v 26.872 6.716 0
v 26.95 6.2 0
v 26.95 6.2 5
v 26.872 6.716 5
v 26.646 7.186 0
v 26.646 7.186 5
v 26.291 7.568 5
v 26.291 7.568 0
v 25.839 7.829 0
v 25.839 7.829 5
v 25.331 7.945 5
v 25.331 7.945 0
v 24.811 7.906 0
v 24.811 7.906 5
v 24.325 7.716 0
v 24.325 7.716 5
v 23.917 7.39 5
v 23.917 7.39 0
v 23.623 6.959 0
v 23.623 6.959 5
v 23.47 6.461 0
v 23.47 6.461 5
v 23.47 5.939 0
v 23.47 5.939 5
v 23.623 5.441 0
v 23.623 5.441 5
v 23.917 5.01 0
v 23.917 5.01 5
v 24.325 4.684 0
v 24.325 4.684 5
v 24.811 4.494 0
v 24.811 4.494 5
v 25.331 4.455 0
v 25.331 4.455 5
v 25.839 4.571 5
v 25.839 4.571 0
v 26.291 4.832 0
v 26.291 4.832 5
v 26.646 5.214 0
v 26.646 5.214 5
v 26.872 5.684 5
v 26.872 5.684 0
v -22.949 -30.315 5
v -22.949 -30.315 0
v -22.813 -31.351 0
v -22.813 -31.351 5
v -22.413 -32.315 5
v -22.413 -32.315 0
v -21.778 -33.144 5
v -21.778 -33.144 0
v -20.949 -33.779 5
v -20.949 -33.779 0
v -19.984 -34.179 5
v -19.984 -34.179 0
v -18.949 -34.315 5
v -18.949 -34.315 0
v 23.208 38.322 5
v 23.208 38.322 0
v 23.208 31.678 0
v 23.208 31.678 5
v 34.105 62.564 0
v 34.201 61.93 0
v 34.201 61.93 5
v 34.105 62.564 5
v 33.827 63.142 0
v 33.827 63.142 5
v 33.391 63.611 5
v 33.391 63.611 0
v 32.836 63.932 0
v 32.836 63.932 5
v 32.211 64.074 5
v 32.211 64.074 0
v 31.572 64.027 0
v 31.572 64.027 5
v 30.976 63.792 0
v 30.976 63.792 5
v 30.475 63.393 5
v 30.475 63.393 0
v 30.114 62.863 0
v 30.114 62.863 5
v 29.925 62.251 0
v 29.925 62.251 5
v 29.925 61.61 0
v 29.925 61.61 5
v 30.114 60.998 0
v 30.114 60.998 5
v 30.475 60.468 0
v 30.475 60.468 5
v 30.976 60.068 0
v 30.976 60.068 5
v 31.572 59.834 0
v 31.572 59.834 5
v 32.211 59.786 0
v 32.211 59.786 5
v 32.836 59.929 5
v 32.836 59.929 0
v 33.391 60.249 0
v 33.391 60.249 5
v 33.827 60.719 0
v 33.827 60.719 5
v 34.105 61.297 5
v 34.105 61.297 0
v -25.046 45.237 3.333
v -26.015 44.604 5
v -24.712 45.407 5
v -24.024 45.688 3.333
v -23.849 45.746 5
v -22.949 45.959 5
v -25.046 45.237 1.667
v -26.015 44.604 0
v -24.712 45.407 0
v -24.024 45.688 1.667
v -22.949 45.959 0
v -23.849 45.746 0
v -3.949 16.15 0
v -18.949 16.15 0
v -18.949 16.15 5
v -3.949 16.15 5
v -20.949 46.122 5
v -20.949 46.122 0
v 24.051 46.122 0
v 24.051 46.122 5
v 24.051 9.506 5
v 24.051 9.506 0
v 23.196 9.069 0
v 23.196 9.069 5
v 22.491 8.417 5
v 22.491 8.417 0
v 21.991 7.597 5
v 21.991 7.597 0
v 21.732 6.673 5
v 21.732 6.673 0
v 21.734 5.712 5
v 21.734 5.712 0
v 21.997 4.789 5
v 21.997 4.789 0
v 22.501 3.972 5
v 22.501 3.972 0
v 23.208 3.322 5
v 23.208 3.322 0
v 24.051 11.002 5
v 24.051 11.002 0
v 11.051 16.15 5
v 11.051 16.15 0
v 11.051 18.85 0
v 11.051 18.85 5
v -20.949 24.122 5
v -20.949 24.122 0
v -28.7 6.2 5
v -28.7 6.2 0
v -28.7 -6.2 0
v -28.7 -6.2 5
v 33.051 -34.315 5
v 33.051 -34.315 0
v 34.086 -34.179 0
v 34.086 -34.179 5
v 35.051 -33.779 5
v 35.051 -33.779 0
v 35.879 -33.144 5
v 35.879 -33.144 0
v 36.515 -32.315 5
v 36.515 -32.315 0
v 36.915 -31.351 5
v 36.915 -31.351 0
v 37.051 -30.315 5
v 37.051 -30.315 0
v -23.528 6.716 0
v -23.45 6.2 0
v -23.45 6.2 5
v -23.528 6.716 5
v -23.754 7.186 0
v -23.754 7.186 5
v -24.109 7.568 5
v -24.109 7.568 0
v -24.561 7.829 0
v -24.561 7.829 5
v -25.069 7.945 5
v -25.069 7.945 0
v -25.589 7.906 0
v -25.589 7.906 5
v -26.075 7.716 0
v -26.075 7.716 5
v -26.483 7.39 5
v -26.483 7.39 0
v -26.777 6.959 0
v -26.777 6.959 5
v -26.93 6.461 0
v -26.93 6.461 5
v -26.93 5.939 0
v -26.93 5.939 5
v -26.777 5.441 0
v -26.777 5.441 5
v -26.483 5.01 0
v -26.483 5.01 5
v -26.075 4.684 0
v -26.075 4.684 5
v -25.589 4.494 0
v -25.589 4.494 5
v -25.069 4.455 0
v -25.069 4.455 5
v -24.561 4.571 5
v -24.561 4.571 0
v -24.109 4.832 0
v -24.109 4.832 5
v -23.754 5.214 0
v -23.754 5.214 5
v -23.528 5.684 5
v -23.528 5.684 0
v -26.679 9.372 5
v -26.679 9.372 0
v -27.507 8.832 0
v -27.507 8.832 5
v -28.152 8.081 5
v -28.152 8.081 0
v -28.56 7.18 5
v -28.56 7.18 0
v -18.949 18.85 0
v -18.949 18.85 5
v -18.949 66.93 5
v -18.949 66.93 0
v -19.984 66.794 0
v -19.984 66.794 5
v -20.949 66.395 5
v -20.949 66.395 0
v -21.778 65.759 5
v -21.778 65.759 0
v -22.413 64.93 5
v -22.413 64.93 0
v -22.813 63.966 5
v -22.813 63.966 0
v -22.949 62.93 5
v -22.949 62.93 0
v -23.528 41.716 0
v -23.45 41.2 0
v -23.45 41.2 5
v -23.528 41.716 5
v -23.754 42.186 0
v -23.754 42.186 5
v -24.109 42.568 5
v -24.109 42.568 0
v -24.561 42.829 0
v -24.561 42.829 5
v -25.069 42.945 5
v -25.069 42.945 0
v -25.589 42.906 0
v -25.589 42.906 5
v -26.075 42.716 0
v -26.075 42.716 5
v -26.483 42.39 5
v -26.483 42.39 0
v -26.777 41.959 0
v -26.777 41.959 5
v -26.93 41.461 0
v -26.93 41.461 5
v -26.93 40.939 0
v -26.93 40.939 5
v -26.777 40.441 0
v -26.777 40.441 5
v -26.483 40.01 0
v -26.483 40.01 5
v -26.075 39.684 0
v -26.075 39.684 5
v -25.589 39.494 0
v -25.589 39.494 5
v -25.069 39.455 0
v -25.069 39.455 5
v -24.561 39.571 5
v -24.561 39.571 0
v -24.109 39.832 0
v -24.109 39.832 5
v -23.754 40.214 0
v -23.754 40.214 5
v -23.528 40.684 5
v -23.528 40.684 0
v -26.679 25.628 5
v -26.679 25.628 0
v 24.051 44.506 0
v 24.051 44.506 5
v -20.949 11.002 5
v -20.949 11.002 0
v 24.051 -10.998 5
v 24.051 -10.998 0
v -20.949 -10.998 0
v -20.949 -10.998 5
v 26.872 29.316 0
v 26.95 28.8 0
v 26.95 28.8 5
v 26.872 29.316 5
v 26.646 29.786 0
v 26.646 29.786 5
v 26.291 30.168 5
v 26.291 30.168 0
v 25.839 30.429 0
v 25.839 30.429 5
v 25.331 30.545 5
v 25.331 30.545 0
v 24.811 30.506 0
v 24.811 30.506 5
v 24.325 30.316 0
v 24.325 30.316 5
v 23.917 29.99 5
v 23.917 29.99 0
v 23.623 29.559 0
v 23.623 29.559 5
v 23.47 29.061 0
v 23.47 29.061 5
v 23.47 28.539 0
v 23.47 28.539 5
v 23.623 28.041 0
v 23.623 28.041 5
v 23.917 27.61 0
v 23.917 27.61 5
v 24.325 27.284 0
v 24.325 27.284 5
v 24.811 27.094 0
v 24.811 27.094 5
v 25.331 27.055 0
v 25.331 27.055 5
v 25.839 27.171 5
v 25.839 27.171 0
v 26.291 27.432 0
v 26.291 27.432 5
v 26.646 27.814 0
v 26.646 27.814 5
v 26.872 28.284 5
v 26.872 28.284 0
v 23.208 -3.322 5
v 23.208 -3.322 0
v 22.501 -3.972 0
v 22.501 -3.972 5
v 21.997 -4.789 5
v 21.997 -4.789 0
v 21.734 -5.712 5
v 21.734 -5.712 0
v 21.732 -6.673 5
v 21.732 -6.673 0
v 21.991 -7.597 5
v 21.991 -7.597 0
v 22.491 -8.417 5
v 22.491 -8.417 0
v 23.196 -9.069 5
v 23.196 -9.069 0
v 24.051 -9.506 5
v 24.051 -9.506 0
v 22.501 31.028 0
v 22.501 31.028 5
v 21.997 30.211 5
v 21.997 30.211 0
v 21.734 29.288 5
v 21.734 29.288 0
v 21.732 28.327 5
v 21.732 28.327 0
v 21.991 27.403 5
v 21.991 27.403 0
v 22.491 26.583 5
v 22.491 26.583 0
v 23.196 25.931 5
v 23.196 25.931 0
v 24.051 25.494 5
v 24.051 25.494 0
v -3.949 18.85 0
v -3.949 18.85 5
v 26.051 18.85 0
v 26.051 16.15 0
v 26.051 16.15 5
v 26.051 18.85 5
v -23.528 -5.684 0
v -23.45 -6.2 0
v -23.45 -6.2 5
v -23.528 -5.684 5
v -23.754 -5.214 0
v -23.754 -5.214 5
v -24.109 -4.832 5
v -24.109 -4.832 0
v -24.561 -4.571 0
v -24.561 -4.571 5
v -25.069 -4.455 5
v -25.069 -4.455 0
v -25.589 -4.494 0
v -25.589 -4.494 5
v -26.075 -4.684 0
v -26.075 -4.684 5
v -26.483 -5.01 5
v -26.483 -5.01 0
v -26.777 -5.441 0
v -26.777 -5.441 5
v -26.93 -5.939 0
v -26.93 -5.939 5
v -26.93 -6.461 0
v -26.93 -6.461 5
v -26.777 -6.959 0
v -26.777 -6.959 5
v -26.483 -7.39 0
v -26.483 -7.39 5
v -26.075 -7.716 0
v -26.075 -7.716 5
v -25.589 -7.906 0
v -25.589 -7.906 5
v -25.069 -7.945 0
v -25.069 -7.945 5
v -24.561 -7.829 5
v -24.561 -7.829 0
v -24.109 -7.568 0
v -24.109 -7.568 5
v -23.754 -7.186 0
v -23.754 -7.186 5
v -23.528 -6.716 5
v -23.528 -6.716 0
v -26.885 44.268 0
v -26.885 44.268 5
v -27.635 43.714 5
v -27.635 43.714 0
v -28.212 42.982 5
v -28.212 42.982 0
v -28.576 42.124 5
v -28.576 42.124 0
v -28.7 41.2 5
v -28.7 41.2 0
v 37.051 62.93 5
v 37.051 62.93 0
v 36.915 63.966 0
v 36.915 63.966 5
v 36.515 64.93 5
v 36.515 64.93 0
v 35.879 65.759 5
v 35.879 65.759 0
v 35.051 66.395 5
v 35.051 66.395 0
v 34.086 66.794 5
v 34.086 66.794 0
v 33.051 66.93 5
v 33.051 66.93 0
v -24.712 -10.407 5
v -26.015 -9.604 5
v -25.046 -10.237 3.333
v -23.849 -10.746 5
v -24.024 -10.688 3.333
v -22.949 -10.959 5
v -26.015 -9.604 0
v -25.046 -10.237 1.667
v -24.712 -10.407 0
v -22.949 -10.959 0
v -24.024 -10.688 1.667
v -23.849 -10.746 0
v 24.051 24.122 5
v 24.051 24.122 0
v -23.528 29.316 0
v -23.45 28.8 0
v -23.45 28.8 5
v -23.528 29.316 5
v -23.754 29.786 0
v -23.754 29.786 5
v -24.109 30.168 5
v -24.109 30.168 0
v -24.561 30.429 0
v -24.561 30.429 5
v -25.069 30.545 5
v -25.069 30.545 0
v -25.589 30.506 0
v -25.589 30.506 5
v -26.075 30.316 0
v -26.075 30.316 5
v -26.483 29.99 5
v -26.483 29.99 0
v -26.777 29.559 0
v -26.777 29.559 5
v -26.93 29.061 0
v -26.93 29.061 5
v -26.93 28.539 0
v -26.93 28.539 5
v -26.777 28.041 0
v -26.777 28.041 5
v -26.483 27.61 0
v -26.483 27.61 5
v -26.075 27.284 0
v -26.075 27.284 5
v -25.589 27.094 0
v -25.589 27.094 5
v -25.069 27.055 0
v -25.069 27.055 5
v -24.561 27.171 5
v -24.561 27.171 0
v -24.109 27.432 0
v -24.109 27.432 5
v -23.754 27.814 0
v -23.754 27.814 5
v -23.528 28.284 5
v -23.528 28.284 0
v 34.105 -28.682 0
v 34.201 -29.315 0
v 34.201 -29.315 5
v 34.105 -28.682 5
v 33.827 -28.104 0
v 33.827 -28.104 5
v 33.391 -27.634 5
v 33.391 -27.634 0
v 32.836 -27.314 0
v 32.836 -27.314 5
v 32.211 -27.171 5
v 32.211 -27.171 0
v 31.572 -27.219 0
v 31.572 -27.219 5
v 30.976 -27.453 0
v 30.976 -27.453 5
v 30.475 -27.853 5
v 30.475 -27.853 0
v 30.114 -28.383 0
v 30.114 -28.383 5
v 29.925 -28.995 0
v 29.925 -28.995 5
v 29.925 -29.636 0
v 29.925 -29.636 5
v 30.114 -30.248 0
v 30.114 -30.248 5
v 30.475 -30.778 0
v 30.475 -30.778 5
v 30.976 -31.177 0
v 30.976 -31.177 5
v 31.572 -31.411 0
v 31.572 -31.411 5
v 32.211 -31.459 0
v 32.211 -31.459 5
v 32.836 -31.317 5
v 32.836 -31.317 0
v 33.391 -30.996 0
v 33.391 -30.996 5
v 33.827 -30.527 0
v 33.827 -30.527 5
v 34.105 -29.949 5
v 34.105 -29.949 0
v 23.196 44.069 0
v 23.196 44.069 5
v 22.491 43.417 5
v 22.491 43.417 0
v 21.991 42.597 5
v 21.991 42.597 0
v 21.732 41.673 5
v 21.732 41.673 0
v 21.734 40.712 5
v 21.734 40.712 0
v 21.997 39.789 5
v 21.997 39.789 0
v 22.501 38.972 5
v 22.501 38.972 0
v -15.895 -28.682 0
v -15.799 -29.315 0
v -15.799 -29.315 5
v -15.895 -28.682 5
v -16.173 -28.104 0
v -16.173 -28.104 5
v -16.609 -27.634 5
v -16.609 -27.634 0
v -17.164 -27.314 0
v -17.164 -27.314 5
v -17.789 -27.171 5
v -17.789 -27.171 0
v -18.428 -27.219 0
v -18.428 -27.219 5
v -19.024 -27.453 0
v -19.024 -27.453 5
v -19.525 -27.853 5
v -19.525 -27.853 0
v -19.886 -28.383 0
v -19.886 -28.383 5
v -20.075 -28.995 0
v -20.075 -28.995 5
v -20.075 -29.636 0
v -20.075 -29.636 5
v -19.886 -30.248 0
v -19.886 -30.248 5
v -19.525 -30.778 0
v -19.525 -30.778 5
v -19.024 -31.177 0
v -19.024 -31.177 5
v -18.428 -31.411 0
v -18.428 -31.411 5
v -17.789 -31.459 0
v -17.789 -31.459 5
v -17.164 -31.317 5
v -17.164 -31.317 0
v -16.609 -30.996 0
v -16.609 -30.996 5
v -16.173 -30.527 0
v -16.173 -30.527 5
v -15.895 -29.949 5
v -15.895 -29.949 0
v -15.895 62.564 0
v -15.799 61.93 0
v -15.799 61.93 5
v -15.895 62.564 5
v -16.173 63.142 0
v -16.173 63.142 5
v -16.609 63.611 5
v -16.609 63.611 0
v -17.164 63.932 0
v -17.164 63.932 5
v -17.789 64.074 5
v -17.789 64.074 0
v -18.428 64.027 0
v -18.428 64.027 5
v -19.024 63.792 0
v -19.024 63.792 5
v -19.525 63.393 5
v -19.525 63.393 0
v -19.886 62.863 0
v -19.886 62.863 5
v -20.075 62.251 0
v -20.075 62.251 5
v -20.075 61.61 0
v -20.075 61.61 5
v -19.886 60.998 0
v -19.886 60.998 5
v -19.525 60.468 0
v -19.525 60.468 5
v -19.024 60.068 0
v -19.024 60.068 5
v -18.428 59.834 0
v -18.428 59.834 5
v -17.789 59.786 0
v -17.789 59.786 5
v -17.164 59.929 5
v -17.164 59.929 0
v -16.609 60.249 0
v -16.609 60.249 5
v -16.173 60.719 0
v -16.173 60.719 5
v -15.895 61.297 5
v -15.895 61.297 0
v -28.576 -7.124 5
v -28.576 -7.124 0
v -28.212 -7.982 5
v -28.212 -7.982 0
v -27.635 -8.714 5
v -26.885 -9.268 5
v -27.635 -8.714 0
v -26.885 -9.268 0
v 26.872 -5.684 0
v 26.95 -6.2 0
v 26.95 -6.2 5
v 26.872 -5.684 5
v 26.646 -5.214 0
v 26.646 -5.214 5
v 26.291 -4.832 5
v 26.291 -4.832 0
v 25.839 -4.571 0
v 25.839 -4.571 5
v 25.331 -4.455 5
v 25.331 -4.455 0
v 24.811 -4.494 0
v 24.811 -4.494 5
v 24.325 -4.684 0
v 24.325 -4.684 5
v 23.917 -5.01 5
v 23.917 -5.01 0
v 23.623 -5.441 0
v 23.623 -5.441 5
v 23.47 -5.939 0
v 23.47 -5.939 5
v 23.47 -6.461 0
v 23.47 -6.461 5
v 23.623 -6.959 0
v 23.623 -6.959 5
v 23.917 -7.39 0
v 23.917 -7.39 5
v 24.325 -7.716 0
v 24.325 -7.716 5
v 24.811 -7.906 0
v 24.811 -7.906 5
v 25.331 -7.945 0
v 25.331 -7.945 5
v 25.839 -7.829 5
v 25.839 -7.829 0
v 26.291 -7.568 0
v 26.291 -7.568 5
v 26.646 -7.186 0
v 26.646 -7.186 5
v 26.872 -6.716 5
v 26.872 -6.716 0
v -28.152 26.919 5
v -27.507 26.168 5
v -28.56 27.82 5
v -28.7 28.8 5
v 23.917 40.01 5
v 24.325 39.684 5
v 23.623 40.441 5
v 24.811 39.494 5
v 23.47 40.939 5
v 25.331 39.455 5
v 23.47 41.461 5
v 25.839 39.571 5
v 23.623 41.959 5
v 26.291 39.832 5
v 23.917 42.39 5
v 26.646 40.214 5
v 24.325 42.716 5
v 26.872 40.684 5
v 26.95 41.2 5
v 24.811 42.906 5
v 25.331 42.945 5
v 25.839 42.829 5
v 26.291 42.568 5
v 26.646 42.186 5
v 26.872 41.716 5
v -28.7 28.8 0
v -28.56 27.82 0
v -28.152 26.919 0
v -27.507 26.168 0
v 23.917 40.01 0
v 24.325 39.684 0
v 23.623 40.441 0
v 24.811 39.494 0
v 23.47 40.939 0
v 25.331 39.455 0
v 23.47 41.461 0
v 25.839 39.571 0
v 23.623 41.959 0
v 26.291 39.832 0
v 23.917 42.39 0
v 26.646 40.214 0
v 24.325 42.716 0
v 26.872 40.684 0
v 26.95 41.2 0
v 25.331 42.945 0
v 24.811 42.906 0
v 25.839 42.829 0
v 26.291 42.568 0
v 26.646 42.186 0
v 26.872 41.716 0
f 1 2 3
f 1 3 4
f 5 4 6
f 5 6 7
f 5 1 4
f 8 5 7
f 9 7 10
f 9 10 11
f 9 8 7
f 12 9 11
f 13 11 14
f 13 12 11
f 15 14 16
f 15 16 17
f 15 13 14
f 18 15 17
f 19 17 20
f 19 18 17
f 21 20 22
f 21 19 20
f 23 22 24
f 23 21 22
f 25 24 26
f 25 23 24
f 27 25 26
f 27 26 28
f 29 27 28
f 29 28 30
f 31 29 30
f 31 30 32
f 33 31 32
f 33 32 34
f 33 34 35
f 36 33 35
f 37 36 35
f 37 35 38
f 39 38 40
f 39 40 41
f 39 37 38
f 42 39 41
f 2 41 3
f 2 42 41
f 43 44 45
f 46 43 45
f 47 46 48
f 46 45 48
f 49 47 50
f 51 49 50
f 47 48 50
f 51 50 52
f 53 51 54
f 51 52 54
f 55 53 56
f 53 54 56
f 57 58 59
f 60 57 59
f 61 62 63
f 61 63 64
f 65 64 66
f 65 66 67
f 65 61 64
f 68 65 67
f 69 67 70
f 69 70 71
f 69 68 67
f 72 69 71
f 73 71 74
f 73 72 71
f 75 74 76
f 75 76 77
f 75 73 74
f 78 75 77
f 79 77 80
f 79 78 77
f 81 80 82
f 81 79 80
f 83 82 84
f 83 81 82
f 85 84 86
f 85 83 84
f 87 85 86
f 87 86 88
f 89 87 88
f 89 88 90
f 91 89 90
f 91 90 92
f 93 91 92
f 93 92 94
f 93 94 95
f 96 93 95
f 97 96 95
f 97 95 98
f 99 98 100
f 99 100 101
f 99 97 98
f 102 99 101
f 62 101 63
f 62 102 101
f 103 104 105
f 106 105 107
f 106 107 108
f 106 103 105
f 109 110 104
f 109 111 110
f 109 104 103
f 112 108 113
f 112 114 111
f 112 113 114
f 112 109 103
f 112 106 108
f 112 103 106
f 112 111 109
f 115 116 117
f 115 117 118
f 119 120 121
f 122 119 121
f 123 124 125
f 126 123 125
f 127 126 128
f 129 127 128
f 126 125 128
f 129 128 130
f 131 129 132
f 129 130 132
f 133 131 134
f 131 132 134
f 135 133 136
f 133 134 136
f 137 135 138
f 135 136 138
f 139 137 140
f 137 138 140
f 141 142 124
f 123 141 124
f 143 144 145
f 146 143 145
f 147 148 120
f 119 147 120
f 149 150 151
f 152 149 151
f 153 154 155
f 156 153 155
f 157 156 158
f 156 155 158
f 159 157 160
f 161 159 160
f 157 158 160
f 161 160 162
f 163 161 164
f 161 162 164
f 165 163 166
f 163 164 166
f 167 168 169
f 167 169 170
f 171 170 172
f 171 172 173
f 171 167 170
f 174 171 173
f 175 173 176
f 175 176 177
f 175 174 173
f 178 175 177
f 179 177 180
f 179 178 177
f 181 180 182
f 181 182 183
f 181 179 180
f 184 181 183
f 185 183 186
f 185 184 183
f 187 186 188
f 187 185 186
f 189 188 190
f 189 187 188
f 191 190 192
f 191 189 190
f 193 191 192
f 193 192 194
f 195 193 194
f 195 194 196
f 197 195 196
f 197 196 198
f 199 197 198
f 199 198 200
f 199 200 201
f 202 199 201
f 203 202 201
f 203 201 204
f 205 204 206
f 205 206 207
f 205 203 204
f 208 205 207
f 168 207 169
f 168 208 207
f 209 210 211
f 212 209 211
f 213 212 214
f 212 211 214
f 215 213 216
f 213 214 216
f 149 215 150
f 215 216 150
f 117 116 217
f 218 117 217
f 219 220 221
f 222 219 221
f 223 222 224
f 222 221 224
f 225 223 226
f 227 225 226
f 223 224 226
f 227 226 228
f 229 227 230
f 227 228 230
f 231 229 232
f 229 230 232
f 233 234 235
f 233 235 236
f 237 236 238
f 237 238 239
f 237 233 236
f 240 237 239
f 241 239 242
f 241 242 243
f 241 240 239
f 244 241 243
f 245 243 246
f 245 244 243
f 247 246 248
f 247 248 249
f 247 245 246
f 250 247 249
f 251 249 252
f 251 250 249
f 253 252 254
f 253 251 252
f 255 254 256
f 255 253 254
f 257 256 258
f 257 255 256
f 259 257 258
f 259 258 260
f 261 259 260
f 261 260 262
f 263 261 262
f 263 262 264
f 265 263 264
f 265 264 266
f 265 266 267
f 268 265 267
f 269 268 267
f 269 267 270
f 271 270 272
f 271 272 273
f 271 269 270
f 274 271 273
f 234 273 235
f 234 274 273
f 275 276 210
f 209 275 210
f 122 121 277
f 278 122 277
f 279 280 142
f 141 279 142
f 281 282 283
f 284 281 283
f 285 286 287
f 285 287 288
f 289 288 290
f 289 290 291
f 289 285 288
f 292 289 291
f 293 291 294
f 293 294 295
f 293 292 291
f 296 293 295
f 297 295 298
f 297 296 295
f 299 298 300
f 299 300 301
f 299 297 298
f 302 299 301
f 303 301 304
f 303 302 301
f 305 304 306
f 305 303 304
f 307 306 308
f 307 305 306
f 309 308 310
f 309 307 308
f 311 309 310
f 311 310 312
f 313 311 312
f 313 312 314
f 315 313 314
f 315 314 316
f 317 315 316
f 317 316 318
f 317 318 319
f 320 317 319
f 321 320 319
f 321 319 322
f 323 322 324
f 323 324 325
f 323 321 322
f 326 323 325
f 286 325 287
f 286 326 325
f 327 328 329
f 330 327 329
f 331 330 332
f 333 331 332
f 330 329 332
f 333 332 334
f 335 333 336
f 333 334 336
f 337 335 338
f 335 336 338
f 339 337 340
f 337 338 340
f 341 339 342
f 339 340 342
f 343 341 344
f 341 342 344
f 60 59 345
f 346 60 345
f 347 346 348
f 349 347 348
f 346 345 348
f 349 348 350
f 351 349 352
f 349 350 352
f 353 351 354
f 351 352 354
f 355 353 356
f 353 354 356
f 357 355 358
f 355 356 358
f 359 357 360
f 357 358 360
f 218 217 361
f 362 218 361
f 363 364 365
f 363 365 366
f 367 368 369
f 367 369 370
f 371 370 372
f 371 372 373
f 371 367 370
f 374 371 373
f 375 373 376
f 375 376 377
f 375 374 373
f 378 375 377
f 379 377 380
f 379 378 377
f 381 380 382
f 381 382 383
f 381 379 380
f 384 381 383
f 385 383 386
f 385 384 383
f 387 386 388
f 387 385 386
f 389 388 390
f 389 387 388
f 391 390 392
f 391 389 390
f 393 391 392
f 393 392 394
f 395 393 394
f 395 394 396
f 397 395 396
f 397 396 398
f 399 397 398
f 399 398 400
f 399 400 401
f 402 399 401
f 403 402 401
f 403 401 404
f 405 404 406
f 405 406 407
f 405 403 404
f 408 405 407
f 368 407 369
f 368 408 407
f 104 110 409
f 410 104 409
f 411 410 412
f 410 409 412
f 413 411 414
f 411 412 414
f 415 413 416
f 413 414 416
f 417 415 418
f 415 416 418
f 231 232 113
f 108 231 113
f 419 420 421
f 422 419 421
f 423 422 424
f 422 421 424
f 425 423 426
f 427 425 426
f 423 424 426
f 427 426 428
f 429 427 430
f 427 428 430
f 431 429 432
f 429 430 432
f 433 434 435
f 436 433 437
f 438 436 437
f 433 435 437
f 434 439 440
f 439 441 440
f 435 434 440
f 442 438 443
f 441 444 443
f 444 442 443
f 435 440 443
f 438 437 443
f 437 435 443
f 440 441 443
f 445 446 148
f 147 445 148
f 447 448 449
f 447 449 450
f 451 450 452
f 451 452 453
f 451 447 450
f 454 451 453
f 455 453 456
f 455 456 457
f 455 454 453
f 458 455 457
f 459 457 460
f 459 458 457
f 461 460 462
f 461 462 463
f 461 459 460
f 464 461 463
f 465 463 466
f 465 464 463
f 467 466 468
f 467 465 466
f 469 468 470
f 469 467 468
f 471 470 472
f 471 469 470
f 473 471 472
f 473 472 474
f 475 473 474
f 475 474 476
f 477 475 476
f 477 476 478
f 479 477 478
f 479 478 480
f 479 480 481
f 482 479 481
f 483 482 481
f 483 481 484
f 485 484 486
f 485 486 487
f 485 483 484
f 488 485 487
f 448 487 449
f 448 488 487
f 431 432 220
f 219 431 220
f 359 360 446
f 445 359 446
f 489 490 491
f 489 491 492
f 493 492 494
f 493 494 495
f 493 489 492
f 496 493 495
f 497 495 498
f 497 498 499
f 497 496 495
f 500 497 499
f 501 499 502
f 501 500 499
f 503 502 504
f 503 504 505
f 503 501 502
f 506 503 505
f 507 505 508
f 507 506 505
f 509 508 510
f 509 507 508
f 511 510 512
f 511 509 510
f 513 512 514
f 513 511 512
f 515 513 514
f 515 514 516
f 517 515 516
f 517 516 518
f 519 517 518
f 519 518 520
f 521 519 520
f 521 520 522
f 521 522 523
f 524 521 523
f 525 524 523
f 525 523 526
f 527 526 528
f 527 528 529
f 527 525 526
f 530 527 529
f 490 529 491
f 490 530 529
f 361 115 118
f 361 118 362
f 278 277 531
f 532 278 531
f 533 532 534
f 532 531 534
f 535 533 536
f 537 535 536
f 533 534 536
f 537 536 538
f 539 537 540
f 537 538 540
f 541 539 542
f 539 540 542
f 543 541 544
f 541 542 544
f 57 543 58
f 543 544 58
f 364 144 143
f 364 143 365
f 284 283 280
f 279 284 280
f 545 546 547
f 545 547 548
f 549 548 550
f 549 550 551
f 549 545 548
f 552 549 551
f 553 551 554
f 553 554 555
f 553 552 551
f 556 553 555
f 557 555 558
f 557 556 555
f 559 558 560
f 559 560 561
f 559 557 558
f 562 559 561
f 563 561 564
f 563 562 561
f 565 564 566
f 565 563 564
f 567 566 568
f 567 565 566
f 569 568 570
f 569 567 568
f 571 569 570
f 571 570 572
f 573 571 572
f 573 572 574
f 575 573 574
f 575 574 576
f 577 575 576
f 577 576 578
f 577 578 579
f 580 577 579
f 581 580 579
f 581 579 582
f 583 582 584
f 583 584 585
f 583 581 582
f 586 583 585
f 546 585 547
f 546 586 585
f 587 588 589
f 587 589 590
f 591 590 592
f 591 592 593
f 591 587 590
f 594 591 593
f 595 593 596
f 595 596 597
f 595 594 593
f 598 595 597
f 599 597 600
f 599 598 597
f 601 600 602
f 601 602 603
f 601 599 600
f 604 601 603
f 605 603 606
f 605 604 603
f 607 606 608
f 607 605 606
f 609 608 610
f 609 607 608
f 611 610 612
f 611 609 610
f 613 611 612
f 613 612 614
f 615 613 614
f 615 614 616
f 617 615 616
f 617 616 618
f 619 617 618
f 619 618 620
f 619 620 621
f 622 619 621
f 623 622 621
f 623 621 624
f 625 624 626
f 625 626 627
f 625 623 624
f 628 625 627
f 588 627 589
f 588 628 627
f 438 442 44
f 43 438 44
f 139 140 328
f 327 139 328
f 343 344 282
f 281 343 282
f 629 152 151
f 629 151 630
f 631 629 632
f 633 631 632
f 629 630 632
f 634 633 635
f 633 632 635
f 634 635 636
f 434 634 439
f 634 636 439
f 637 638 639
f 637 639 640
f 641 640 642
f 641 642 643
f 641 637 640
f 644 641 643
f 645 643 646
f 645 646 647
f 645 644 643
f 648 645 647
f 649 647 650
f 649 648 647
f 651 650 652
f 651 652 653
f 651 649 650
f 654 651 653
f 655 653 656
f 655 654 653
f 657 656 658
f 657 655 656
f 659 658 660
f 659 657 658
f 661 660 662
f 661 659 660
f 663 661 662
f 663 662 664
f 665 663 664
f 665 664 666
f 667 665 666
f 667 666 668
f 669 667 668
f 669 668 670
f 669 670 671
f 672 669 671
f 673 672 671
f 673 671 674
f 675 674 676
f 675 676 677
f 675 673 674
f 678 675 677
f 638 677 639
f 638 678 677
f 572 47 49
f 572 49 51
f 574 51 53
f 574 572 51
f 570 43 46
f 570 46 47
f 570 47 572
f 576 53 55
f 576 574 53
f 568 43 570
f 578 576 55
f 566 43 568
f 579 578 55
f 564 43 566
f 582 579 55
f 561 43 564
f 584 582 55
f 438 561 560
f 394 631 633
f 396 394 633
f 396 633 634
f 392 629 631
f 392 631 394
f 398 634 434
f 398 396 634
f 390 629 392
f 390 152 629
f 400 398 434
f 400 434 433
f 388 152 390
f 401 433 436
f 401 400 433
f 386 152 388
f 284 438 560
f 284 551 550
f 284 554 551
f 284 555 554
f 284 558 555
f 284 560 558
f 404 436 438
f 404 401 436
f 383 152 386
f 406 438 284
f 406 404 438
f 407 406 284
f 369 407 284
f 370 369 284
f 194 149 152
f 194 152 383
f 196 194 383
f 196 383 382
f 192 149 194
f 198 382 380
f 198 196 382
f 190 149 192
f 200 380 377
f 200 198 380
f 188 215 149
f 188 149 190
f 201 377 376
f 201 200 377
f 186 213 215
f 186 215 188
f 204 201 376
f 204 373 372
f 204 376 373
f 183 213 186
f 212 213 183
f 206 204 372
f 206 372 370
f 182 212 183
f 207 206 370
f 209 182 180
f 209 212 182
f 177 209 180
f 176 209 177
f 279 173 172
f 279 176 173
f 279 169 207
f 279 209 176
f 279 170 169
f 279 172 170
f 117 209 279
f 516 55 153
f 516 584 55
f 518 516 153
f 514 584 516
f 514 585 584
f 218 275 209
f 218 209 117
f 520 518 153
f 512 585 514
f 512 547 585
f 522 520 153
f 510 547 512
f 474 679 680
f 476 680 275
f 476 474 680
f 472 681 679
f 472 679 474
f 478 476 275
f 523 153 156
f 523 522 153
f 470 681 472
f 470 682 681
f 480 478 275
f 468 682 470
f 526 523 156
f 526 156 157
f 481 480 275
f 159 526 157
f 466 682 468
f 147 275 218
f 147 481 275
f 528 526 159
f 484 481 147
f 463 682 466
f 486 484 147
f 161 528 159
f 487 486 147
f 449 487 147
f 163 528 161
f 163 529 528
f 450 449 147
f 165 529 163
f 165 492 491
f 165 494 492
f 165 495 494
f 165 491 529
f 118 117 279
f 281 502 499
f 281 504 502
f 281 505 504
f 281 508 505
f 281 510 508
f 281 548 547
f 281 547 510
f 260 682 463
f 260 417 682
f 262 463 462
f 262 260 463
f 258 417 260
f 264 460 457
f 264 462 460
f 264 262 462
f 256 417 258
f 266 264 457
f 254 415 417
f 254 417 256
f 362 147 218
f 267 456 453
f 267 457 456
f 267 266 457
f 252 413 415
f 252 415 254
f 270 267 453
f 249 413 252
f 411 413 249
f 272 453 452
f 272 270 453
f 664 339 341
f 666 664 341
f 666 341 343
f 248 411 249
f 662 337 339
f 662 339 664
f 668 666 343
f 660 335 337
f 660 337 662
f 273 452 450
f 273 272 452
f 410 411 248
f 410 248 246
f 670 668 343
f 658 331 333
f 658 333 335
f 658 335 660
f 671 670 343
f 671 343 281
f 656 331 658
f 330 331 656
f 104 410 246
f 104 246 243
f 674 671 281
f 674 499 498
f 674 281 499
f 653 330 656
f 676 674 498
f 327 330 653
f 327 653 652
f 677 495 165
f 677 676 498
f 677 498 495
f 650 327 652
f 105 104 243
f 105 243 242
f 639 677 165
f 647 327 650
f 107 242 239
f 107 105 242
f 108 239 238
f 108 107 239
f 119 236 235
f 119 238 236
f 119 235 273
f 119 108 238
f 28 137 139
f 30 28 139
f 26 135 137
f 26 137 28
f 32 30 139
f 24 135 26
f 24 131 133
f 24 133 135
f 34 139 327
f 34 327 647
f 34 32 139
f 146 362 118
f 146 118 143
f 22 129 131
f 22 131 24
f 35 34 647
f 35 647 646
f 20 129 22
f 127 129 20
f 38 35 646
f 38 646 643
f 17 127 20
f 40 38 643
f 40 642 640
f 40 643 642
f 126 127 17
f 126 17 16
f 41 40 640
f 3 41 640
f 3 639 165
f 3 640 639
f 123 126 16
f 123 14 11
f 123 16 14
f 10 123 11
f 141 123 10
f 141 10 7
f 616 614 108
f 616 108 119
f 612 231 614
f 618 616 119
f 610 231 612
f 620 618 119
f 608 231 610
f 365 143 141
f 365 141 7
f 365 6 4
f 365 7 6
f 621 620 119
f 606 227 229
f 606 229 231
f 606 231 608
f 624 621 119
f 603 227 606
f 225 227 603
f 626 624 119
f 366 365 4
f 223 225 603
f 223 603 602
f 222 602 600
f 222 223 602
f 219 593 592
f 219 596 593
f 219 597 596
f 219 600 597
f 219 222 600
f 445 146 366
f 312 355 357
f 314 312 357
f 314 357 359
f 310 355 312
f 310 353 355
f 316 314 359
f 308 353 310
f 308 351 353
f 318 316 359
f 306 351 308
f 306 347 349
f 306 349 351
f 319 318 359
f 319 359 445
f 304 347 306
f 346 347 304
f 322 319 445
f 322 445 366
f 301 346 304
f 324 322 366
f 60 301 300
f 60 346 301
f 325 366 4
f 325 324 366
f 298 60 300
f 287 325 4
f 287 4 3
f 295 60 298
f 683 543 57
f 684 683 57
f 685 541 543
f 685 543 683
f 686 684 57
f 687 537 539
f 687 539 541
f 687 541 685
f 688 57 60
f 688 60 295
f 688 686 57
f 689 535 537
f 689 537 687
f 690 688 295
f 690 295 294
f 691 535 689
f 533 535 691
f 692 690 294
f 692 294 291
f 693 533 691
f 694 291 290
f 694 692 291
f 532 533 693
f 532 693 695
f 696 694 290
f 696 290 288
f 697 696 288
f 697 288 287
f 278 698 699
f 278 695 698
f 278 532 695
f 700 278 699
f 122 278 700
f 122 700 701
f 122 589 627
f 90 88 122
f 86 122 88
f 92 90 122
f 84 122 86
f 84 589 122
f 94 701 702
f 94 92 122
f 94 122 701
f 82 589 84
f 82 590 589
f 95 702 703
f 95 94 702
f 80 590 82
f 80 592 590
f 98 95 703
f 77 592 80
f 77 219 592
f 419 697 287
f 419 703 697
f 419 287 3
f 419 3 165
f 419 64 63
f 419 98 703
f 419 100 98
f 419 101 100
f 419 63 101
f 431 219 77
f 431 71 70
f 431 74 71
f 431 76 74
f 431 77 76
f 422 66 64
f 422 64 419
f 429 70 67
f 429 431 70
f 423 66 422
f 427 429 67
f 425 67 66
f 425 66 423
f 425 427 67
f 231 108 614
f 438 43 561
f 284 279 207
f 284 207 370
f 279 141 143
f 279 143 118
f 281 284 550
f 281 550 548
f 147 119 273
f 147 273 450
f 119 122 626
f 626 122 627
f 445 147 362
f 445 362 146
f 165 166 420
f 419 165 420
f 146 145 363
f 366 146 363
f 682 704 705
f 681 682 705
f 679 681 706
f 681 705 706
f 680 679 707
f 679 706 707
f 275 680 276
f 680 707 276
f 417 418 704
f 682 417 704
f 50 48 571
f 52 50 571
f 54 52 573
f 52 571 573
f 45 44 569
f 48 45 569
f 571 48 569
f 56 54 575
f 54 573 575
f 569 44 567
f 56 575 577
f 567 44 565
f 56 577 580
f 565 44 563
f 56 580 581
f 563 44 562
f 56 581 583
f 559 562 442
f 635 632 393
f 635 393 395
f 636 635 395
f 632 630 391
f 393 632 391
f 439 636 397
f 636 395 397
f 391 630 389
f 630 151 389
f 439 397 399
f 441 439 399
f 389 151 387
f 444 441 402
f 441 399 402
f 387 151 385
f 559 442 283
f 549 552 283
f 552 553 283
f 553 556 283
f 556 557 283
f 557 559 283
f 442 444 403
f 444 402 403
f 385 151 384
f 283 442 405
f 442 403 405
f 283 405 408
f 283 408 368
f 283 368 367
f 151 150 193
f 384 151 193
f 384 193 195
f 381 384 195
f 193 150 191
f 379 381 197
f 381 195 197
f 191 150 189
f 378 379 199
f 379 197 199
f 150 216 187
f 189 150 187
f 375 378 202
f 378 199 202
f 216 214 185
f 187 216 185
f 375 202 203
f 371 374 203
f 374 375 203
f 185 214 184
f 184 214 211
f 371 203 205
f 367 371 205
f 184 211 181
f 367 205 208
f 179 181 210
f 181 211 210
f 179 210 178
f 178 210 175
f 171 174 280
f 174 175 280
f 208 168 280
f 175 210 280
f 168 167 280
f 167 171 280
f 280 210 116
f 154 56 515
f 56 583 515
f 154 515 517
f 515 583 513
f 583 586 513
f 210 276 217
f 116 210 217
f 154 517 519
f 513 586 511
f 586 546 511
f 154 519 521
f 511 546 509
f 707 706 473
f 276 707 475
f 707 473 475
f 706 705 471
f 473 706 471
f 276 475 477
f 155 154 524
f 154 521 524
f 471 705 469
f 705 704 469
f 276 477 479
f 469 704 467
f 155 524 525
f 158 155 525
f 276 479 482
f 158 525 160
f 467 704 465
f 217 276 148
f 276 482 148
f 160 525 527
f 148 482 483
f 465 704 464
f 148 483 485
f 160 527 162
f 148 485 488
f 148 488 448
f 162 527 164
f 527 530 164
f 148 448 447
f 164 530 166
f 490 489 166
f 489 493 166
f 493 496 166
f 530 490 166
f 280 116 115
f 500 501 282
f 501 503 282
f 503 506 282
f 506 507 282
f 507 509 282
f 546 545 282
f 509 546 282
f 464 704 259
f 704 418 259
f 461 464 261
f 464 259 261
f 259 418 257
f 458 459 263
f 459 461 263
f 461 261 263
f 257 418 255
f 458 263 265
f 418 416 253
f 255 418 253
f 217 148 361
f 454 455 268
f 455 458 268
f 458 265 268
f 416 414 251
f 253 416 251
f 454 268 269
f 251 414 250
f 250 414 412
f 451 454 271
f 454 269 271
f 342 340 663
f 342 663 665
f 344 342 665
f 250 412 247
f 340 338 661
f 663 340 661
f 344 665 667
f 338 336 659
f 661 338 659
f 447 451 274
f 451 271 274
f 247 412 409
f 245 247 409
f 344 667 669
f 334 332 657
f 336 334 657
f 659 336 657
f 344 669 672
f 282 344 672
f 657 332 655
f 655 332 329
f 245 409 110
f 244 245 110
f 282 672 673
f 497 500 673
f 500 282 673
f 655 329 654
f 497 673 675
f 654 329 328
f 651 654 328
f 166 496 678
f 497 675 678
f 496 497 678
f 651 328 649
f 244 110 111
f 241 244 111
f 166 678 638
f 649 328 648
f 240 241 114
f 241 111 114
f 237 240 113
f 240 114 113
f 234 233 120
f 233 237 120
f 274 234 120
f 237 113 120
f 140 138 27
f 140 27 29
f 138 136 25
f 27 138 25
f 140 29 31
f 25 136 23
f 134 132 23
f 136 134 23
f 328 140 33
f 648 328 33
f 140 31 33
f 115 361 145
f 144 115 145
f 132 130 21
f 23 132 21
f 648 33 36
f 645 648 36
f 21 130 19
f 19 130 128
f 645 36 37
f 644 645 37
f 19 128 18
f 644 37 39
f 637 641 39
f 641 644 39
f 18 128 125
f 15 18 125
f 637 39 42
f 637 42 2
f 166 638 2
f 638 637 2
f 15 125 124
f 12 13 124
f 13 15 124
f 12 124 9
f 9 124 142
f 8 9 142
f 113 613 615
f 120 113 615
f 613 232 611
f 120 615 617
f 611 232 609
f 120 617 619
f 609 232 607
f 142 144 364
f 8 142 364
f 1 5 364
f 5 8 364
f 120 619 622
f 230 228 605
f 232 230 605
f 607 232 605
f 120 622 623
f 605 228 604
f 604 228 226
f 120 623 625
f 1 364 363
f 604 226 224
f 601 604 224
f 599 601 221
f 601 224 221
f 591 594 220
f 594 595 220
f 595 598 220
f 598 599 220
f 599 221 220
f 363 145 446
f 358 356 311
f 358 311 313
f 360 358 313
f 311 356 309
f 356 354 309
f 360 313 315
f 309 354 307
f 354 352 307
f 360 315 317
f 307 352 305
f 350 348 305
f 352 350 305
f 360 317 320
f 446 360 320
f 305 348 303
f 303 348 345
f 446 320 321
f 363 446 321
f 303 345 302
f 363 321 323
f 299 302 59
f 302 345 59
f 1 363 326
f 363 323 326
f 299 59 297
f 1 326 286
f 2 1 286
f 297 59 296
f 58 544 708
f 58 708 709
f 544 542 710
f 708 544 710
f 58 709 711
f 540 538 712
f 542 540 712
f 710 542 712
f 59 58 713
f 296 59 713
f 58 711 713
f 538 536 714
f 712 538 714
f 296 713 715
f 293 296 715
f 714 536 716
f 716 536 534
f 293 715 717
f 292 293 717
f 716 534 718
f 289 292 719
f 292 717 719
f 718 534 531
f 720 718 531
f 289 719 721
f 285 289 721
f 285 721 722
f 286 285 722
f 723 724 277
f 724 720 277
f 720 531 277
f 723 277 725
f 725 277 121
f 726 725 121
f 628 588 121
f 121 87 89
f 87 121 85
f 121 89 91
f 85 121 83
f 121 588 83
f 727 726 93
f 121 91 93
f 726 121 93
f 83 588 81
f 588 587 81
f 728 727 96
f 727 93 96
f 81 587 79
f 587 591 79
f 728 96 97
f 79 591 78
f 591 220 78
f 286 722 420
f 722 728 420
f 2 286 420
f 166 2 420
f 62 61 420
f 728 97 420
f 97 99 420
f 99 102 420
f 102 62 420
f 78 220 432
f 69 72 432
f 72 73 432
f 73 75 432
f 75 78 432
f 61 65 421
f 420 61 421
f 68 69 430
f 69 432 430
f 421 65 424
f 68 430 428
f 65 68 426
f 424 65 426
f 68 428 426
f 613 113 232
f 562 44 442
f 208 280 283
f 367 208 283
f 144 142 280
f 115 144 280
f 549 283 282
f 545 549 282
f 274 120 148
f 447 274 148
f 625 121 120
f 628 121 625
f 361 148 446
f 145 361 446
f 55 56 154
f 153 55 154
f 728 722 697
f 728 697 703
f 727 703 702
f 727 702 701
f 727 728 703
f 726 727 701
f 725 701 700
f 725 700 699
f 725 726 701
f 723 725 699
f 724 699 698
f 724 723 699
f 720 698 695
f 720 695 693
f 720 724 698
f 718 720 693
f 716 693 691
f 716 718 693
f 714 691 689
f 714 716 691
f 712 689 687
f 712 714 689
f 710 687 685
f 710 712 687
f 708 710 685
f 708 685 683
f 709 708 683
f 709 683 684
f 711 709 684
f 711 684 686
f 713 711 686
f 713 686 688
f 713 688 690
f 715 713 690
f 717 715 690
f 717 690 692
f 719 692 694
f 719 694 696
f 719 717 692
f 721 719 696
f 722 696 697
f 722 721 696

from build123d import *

# Parameters (mm, degrees)
SKETCH1_R           = 1.75
SKETCH1_R_2         = 2.15
SKETCH1_W           = 15
SKETCH1_H           = 2.7
BOSS_EXTRUDE1_DEPTH = 5


with BuildPart() as part:
    # Sketch1 → Boss-Extrude1 (new body)
    with BuildSketch(Plane.XY):
        with BuildLine():
            Line((33.050798555, 66.930419372), (-18.949201445, 66.930419372))
            ThreePointArc((-18.949201445, 66.930419372), (-21.77762857, 65.758846497), (-22.949201445, 62.930419372))
            Line((-22.949201445, 62.930419372), (-22.949201445, 45.959184597))
            add(Edge.make_bspline(
                [(-26.015204316, 44.603739403), (-25.073035607, 45.327145808), (-24.05103465, 45.778960873), (-22.949201445, 45.959184597)],
                knots=[0, 0, 0, 0, 0.632660701, 0.632660701, 0.632660701, 0.632660701], degree=3))
            ThreePointArc((-26.015204316, 44.603739403), (-27.948018841, 43.367577553), (-28.7, 41.2))
            Line((-28.7, 41.2), (-28.7, 28.8))
            ThreePointArc((-28.7, 28.8), (-28.151687317, 26.919164552), (-26.678547439, 25.62763535))
            Line((-26.678547439, 25.62763535), (-26.678547439, 9.37236465))
            ThreePointArc((-26.678547439, 9.37236465), (-28.151687317, 8.080835448), (-28.7, 6.2))
            Line((-28.7, 6.2), (-28.7, -6.2))
            ThreePointArc((-28.7, -6.2), (-27.948018841, -8.367577553), (-26.015204316, -9.603739403))
            add(Edge.make_bspline(
                [(-26.015204316, -9.603739403), (-25.073035607, -10.327145808), (-24.05103465, -10.778960873), (-22.949201445, -10.959184597)],
                knots=[0, 0, 0, 0, 0.632660701, 0.632660701, 0.632660701, 0.632660701], degree=3))
            Line((-22.949201445, -10.959184597), (-22.949201445, -30.315366628))
            ThreePointArc((-22.949201445, -30.315366628), (-21.77762857, -33.143793753), (-18.949201445, -34.315366628))
            Line((-18.949201445, -34.315366628), (33.050798555, -34.315366628))
            ThreePointArc((33.050798555, -34.315366628), (35.879225679, -33.143793753), (37.050798555, -30.315366628))
            Line((37.050798555, -30.315366628), (37.050798555, 62.930419372))
            ThreePointArc((37.050798555, 62.930419372), (35.879225679, 65.758846497), (33.050798555, 66.930419372))
        make_face()
        with Locations((-25.2, -6.2)):
            Circle(SKETCH1_R, mode=Mode.SUBTRACT)
        with Locations((-25.2, 6.2)):
            Circle(SKETCH1_R, mode=Mode.SUBTRACT)
        with Locations((-17.949201445, 61.930418903)):
            Circle(SKETCH1_R_2, mode=Mode.SUBTRACT)
        with Locations((32.050798555, 61.930418903)):
            Circle(SKETCH1_R_2, mode=Mode.SUBTRACT)
        with Locations((32.050798555, -29.315366628)):
            Circle(SKETCH1_R_2, mode=Mode.SUBTRACT)
        with Locations((-17.949201445, -29.315366628)):
            Circle(SKETCH1_R_2, mode=Mode.SUBTRACT)
        with Locations((25.2, 28.8)):
            Circle(SKETCH1_R, mode=Mode.SUBTRACT)
        with Locations((25.2, 41.2)):
            Circle(SKETCH1_R, mode=Mode.SUBTRACT)
        with Locations((-25.2, 28.8)):
            Circle(SKETCH1_R, mode=Mode.SUBTRACT)
        with Locations((-25.2, 41.2)):
            Circle(SKETCH1_R, mode=Mode.SUBTRACT)
        with Locations((25.2, 6.2)):
            Circle(SKETCH1_R, mode=Mode.SUBTRACT)
        with Locations((25.2, -6.2)):
            Circle(SKETCH1_R, mode=Mode.SUBTRACT)
        with BuildLine():
            Line((-20.949201445, 46.122161619), (24.050798555, 46.122161619))
            Line((24.050798555, 46.122161619), (24.050798555, 44.505954633))
            ThreePointArc((24.050798555, 44.505954633), (21.732055874, 41.672613518), (23.208062077, 38.322121735))
            Line((23.208062077, 38.322121735), (23.208062077, 31.677878265))
            ThreePointArc((23.208062077, 31.677878265), (21.732055874, 28.327386482), (24.050798555, 25.494045367))
            Line((24.050798555, 25.494045367), (24.050798555, 24.122161619))
            Line((24.050798555, 24.122161619), (-20.949201445, 24.122161619))
            Line((-20.949201445, 24.122161619), (-20.949201445, 46.122161619))
        make_face(mode=Mode.SUBTRACT)
        with BuildLine():
            Line((-20.949201445, 11.001569649), (24.050798555, 11.001569649))
            Line((24.050798555, 11.001569649), (24.050798555, 9.505954633))
            ThreePointArc((24.050798555, 9.505954633), (21.732055874, 6.672613518), (23.208062077, 3.322121735))
            Line((23.208062077, 3.322121735), (23.208062077, -3.322121735))
            ThreePointArc((23.208062077, -3.322121735), (21.732055874, -6.672613518), (24.050798555, -9.505954633))
            Line((24.050798555, -9.505954633), (24.050798555, -10.998430351))
            Line((24.050798555, -10.998430351), (-20.949201445, -10.998430351))
            Line((-20.949201445, -10.998430351), (-20.949201445, 11.001569649))
        make_face(mode=Mode.SUBTRACT)
        with Locations((-11.449201445, 17.5)):
            Rectangle(SKETCH1_W, SKETCH1_H, mode=Mode.SUBTRACT)
        with Locations((18.550798555, 17.5)):
            Rectangle(SKETCH1_W, SKETCH1_H, mode=Mode.SUBTRACT)
    extrude(amount=BOSS_EXTRUDE1_DEPTH)


solid = part.part
